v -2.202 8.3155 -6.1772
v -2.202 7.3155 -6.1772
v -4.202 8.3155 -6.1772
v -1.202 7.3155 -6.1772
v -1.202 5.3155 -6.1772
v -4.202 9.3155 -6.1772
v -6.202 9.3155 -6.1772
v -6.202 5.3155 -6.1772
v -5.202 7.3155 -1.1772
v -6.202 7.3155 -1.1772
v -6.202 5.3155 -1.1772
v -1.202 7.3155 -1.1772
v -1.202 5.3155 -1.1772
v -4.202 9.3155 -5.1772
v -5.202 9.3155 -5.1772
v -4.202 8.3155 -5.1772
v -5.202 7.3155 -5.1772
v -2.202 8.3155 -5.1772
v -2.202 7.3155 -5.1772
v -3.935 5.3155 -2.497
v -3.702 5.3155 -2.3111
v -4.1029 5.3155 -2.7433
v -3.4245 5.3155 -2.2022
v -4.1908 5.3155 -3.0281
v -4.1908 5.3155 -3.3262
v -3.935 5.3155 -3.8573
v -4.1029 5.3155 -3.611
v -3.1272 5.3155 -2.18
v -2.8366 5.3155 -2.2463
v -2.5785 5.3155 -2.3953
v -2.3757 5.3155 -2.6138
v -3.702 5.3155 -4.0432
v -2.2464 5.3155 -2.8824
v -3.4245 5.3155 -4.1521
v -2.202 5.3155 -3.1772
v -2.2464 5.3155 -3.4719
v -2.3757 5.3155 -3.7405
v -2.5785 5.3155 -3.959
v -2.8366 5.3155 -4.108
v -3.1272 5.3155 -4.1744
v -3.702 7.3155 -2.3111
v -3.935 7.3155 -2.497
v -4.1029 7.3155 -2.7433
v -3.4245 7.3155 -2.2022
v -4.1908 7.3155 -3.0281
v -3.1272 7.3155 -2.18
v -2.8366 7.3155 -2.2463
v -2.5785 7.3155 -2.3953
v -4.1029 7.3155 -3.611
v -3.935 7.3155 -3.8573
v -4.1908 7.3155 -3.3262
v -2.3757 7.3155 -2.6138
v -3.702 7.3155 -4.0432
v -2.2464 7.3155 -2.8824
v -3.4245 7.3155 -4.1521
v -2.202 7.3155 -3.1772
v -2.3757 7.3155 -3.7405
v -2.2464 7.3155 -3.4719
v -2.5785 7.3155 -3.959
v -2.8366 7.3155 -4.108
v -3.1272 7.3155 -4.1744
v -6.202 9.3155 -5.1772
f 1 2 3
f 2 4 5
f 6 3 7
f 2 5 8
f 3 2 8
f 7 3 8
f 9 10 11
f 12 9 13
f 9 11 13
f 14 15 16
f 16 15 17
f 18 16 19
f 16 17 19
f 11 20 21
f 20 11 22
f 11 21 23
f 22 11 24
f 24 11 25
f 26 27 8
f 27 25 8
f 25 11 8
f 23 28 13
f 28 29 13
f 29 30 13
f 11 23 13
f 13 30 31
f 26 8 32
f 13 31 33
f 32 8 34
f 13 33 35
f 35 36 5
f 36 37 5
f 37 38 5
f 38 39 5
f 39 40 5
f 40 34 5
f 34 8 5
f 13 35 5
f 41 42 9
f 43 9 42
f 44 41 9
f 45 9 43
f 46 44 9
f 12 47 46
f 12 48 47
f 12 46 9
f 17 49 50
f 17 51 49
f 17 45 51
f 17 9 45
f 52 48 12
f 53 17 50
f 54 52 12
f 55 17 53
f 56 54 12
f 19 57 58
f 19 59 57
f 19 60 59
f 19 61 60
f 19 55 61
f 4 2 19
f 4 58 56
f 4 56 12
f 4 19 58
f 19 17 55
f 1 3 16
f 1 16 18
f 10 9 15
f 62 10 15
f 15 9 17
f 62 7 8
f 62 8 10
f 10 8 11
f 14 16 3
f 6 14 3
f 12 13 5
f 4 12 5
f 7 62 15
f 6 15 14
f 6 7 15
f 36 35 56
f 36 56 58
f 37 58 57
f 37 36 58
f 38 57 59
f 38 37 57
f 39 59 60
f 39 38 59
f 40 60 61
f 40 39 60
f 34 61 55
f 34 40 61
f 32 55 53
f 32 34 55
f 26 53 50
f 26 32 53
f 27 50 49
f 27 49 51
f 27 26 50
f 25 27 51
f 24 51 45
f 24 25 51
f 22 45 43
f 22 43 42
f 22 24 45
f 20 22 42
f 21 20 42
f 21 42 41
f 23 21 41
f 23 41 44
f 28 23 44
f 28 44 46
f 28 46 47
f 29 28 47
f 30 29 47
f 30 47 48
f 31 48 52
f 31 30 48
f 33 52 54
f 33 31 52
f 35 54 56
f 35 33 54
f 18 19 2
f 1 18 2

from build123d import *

# Parameters (mm, degrees)
SKETCH_1_R          = 5
EXTRUDE_1_DEPTH     = 10
SKETCH_1_3_W        = 10
SKETCH_1_3_H        = 5
EXTRUDE_2_DEPTH     = 15
EXTRUDE_3_DEPTH     = 20
CUT_EXTRUDE_1_DEPTH = 20
SCALE_1_SCALE       = 0.2


with BuildPart() as part:
    # 草圖1 → 填料-伸長1 (new body)
    with BuildSketch(Plane(origin=(0, 0, 0), x_dir=(1, 0, 0), z_dir=(0, 1, 0))):
        Polygon((10, 15), (5, 15), (5, 10), (-5, 10), (-10, 10), (-10, -10), (10, -10), align=None)
        Circle(SKETCH_1_R, mode=Mode.SUBTRACT)
    extrude(amount=EXTRUDE_1_DEPTH)

    # 草圖1<3> → 填料-伸長2 (add)
    with BuildSketch(Plane(origin=(0, 0, 0), x_dir=(1, 0, 0), z_dir=(0, 1, 0))):
        with Locations((0, 12.5)):
            Rectangle(SKETCH_1_3_W, SKETCH_1_3_H)
    extrude(amount=EXTRUDE_2_DEPTH)

    # 草圖1<4> → 填料-伸長3 (add)
    with BuildSketch(Plane(origin=(0, 0, 0), x_dir=(1, 0, 0), z_dir=(0, 1, 0))):
        Polygon((-5, 15), (-15, 15), (-15, -10), (-10, -10), (-10, 10), (-5, 10), align=None)
    extrude(amount=EXTRUDE_3_DEPTH)

    # 草圖2 → 除料-伸長1 (cut)
    with BuildSketch(Plane(origin=(-10, 0, 0), x_dir=(0, 0, -1), z_dir=(1, 0, 0))):
        Polygon((-10, 10), (10, 20), (-10, 20), align=None)
    extrude(amount=-CUT_EXTRUDE_1_DEPTH, mode=Mode.SUBTRACT)


with BuildPart() as part_1:
    # 縮放比例1: scaled about (-4.00247113, 6.644426123, -3.971444222)
    add(part.part.scale(SCALE_1_SCALE).moved(Location((-3.201976904, 5.315540898, -3.177155378))))


solid = part_1.part
